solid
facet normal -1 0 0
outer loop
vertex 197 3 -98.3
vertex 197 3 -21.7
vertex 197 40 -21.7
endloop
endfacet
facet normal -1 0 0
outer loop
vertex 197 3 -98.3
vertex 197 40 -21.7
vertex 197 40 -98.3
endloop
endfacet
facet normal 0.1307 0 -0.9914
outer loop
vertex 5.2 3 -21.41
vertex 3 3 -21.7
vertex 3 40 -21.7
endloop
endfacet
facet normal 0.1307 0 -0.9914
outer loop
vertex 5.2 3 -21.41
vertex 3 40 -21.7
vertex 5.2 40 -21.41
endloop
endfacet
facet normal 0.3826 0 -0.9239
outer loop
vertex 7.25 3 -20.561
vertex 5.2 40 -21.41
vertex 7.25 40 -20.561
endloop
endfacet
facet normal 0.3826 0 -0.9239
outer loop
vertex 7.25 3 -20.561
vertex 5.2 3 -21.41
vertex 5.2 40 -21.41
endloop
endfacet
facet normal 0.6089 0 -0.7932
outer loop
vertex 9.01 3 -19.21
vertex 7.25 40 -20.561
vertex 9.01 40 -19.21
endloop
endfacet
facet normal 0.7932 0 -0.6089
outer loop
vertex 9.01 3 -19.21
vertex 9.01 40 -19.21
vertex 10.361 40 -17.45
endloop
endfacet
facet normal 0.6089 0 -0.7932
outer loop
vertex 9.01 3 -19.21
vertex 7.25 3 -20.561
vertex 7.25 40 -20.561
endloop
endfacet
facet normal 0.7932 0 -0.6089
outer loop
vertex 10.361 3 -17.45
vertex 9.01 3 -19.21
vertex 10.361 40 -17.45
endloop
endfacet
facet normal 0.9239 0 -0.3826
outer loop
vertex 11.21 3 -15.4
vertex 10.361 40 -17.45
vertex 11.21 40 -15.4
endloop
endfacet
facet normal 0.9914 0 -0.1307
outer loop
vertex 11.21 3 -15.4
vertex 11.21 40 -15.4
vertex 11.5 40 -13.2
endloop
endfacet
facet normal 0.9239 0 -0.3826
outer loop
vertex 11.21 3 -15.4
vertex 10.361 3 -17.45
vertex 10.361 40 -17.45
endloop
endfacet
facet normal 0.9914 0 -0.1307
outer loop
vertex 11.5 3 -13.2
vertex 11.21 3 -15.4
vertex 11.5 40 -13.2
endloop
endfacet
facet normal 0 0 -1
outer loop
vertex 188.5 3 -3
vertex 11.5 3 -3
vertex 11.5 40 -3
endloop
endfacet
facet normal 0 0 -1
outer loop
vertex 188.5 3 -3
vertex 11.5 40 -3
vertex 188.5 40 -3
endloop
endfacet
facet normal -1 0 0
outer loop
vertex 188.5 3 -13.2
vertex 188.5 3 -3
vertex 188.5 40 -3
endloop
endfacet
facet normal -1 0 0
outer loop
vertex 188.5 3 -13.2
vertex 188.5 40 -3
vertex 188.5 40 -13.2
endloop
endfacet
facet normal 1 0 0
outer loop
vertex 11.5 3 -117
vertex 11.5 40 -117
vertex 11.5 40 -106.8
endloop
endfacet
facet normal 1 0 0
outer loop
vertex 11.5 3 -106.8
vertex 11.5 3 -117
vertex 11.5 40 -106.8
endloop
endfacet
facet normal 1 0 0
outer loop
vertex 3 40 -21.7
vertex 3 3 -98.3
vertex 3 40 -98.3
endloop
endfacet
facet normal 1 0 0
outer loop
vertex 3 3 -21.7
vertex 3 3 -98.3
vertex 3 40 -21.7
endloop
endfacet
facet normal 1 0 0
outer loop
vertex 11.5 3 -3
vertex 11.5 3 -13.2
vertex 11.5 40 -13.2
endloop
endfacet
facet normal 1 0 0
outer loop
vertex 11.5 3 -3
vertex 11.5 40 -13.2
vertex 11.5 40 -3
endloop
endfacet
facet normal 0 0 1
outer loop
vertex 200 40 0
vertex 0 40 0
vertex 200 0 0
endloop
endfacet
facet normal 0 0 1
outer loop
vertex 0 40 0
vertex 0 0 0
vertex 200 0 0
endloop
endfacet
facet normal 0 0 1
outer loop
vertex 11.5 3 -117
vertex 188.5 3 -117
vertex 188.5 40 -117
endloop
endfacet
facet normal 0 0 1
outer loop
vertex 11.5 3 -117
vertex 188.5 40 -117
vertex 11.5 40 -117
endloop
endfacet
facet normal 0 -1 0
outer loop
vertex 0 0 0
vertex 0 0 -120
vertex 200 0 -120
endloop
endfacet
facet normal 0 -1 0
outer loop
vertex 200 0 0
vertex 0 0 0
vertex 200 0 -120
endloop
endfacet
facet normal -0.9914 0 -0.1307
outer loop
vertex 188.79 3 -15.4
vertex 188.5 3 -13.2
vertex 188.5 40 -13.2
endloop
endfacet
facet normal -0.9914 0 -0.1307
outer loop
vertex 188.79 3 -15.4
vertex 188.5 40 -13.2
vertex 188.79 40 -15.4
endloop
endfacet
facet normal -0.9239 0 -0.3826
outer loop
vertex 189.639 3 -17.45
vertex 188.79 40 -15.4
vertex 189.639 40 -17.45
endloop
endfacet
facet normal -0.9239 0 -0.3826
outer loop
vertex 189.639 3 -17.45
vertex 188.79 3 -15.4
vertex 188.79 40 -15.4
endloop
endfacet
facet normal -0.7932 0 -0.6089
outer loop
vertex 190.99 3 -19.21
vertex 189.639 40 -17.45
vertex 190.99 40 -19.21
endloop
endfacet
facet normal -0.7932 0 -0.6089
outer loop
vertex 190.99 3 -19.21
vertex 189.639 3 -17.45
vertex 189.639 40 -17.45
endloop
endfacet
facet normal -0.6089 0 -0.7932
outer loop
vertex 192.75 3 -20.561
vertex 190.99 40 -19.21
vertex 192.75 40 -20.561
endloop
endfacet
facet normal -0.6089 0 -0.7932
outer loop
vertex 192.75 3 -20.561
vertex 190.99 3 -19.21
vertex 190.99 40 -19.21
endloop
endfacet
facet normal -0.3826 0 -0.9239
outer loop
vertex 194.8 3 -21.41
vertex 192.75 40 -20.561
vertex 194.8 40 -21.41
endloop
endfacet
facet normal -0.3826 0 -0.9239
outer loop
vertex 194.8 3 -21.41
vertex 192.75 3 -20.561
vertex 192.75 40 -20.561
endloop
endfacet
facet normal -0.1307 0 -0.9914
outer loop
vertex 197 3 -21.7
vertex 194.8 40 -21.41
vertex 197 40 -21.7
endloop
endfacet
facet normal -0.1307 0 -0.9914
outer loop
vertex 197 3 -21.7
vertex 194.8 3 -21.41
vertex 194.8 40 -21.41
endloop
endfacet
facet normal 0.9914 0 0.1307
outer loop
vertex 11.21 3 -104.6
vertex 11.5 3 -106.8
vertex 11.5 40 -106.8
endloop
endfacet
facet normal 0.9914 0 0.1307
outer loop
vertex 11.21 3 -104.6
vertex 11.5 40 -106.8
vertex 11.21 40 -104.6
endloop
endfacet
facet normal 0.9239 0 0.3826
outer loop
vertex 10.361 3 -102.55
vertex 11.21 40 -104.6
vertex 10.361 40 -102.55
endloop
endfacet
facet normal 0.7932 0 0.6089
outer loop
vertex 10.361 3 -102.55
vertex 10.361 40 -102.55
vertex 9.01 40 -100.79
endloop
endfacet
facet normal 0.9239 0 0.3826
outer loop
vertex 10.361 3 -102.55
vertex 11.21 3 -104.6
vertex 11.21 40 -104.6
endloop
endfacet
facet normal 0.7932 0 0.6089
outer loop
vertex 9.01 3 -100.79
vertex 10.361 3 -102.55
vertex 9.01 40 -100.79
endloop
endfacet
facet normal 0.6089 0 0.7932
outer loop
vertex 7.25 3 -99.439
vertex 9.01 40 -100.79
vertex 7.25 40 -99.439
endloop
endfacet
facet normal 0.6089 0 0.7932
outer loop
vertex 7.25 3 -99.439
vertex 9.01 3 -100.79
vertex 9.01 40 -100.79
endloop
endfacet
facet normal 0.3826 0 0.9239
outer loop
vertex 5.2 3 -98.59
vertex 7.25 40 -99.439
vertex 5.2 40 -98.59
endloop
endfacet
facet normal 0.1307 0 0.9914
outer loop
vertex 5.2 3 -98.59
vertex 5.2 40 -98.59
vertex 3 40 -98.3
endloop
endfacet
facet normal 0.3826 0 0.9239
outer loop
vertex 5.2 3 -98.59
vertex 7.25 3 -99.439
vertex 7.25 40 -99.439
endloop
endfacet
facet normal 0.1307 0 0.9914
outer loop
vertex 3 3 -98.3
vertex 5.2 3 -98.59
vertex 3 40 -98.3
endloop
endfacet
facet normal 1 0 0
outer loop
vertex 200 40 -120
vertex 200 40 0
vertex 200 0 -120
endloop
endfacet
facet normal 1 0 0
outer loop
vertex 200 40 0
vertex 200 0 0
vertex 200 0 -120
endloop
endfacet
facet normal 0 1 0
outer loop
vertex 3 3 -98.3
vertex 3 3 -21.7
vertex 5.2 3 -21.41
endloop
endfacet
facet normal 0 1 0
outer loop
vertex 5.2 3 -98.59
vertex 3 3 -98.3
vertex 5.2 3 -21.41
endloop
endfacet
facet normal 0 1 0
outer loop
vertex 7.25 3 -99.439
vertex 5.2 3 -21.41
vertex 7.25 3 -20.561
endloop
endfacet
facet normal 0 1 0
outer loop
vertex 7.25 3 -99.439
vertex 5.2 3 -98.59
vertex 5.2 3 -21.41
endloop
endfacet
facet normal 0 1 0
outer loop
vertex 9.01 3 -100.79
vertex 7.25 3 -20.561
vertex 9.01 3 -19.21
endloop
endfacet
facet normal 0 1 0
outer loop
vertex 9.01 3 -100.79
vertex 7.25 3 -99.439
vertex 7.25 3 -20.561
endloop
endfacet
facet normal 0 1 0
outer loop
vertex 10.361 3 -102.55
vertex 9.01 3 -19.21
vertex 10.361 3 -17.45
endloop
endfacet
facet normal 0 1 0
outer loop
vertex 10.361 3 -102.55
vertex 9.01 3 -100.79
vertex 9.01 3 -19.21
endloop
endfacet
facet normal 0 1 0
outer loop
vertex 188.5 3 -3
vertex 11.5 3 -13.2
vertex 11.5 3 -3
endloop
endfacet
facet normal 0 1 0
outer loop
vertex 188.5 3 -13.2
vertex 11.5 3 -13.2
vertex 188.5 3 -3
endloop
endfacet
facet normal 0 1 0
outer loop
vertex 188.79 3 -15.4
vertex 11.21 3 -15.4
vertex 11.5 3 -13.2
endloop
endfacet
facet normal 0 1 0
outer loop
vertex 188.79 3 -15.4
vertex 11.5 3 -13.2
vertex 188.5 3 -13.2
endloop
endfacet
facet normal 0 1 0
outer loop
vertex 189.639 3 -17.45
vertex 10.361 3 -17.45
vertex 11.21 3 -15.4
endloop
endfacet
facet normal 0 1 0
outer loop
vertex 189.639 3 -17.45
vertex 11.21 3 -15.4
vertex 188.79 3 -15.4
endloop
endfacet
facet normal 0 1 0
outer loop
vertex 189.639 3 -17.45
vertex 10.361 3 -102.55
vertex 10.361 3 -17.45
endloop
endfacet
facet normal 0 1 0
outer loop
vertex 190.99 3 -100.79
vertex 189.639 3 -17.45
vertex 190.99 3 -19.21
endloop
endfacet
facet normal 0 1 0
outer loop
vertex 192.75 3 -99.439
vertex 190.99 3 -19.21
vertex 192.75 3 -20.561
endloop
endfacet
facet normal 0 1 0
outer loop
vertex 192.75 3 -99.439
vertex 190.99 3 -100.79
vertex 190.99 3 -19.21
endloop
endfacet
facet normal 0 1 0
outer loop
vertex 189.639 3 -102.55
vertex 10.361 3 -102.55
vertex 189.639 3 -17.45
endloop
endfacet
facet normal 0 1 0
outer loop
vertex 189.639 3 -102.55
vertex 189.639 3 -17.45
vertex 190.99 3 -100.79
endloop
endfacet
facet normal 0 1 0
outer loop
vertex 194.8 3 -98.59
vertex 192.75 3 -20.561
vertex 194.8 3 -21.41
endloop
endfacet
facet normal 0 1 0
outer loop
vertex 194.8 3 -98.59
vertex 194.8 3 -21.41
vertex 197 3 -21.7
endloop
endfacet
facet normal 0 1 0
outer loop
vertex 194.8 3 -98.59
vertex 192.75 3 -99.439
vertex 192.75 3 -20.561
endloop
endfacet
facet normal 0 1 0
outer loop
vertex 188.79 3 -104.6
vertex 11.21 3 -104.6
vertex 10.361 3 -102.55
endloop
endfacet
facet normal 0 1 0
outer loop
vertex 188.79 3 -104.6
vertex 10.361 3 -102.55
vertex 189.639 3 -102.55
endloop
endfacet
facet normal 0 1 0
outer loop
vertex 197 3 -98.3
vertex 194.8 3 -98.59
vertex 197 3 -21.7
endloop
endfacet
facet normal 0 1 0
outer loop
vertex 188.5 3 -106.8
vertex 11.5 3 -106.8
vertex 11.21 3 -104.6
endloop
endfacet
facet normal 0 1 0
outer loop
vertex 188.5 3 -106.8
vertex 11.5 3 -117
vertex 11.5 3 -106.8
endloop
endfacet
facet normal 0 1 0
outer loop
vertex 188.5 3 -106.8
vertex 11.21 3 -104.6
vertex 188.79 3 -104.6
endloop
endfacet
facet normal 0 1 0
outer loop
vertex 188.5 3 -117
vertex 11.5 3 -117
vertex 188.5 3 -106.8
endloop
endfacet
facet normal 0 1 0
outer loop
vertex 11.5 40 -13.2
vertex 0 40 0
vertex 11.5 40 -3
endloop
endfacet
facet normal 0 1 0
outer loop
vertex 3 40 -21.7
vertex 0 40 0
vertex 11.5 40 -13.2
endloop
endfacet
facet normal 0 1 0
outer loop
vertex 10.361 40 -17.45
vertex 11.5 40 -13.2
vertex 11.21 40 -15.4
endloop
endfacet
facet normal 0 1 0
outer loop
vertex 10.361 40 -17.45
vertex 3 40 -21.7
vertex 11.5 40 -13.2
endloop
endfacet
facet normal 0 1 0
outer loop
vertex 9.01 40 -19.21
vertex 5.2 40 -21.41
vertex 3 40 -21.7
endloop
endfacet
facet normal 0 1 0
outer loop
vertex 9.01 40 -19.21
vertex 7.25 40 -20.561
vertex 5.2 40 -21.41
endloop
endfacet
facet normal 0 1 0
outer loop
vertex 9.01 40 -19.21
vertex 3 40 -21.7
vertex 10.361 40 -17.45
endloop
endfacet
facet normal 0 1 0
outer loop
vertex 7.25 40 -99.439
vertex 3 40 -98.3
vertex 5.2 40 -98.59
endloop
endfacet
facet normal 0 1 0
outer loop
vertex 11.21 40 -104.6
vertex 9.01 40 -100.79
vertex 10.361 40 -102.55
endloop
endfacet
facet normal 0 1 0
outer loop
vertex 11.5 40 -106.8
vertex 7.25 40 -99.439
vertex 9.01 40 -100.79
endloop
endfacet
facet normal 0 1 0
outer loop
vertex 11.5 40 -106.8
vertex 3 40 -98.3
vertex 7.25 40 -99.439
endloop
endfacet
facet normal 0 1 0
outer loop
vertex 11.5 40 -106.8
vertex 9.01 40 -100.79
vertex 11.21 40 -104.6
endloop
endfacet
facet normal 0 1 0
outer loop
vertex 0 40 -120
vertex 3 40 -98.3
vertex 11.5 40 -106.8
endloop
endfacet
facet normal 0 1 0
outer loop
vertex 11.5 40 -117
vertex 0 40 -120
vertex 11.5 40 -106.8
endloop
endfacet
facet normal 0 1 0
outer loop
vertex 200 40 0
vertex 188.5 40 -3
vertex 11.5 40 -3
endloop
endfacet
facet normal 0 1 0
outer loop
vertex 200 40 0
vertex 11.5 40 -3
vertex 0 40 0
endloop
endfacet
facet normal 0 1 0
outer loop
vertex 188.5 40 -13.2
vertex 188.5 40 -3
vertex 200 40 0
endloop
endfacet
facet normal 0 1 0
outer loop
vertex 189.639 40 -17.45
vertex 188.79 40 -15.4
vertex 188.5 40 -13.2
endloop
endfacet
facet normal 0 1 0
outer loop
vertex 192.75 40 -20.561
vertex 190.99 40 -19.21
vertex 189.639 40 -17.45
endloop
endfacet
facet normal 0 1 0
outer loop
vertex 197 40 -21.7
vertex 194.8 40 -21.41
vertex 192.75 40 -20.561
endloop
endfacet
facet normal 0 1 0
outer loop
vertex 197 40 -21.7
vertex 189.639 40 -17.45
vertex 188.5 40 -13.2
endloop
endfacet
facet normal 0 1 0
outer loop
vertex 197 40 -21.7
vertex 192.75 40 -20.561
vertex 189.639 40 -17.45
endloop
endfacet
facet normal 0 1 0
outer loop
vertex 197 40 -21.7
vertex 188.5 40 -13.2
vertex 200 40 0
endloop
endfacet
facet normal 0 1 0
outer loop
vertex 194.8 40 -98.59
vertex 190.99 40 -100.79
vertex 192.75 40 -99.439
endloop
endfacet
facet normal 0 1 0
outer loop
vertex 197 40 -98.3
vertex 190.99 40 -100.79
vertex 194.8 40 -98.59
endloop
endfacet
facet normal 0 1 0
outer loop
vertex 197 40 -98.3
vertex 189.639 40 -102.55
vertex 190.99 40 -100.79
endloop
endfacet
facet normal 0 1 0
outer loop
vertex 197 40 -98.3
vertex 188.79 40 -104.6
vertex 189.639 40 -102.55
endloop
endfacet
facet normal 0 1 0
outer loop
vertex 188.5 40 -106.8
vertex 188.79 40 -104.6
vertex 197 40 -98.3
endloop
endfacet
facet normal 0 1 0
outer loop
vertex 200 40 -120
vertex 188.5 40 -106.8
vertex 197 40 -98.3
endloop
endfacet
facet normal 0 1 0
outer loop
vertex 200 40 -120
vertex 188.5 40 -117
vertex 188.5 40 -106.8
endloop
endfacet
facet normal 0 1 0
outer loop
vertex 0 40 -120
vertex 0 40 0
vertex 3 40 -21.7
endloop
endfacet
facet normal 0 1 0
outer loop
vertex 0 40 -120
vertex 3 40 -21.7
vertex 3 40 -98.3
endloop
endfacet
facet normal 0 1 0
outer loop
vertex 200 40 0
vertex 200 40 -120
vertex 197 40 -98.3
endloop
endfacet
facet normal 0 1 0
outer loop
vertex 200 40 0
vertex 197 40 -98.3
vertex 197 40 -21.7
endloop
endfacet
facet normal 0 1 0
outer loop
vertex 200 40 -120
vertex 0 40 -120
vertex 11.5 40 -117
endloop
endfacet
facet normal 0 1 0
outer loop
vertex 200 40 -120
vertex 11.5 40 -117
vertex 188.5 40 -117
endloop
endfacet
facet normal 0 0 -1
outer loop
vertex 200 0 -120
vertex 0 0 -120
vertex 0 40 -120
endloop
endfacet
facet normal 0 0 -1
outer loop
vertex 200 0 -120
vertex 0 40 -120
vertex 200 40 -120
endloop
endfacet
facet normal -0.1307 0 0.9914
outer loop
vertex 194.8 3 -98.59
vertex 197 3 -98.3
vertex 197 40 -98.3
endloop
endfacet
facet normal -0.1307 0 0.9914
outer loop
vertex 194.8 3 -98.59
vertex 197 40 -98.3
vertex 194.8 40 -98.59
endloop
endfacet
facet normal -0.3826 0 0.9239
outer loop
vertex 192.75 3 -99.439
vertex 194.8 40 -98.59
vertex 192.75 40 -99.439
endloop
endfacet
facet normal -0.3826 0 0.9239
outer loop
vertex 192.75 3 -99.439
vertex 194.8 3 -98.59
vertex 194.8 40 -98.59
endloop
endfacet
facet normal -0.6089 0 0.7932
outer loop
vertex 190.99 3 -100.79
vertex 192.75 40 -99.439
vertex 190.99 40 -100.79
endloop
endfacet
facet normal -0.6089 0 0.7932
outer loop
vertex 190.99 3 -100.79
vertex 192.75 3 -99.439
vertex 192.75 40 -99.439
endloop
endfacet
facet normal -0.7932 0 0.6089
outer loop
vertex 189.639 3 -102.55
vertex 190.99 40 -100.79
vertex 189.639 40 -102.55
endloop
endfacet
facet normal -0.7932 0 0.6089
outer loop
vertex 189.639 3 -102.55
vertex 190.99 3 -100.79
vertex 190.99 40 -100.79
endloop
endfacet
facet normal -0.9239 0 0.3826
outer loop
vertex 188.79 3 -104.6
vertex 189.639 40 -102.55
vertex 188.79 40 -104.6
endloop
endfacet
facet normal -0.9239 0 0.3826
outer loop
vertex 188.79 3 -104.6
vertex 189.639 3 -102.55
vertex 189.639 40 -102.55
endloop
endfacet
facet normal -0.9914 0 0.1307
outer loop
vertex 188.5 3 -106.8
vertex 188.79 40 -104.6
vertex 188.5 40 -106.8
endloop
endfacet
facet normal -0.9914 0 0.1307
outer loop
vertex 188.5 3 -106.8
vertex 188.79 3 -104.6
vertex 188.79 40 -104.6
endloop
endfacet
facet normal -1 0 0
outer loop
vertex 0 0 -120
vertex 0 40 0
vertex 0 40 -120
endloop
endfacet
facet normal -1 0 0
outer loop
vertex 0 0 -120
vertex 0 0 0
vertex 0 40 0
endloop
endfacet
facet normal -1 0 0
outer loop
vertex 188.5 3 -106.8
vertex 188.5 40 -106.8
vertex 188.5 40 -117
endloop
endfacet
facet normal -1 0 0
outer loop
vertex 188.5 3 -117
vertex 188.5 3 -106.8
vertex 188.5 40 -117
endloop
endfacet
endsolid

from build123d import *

# Parameters (mm, degrees)
SKETCH1_W           = 200
SKETCH1_H           = 120
BOSS_EXTRUDE1_DEPTH = 3
SKETCH2_W           = 200
SKETCH2_H           = 120
BOSS_EXTRUDE2_DEPTH = 37


with BuildPart() as part:
    # Sketch1 → Boss-Extrude1 (new body)
    with BuildSketch(Plane(origin=(0, 0, 0), x_dir=(1, 0, 0), z_dir=(0, 1, 0))):
        with Locations((100, 60)):
            Rectangle(SKETCH1_W, SKETCH1_H)
    extrude(amount=BOSS_EXTRUDE1_DEPTH)

    # Sketch2 → Boss-Extrude2 (add)
    with BuildSketch(Plane(origin=(0, 3, 0), x_dir=(1, 0, 0), z_dir=(0, 1, 0))):
        with Locations((100, 60)):
            Rectangle(SKETCH2_W, SKETCH2_H)
        with BuildLine():
            Line((3, 98.3), (3, 21.7))
            ThreePointArc((3, 21.7), (9.01040764, 19.21040764), (11.5, 13.2))
            Line((11.5, 13.2), (11.5, 3))
            Line((11.5, 3), (188.5, 3))
            Line((188.5, 3), (188.5, 13.2))
            ThreePointArc((188.5, 13.2), (190.98959236, 19.21040764), (197, 21.7))
            Line((197, 21.7), (197, 98.3))
            ThreePointArc((197, 98.3), (190.98959236, 100.78959236), (188.5, 106.8))
            Line((188.5, 106.8), (188.5, 117))
            Line((188.5, 117), (11.5, 117))
            Line((11.5, 117), (11.5, 106.8))
            ThreePointArc((11.5, 106.8), (9.01040764, 100.78959236), (3, 98.3))
        make_face(mode=Mode.SUBTRACT)
    extrude(amount=BOSS_EXTRUDE2_DEPTH)


solid = part.part
